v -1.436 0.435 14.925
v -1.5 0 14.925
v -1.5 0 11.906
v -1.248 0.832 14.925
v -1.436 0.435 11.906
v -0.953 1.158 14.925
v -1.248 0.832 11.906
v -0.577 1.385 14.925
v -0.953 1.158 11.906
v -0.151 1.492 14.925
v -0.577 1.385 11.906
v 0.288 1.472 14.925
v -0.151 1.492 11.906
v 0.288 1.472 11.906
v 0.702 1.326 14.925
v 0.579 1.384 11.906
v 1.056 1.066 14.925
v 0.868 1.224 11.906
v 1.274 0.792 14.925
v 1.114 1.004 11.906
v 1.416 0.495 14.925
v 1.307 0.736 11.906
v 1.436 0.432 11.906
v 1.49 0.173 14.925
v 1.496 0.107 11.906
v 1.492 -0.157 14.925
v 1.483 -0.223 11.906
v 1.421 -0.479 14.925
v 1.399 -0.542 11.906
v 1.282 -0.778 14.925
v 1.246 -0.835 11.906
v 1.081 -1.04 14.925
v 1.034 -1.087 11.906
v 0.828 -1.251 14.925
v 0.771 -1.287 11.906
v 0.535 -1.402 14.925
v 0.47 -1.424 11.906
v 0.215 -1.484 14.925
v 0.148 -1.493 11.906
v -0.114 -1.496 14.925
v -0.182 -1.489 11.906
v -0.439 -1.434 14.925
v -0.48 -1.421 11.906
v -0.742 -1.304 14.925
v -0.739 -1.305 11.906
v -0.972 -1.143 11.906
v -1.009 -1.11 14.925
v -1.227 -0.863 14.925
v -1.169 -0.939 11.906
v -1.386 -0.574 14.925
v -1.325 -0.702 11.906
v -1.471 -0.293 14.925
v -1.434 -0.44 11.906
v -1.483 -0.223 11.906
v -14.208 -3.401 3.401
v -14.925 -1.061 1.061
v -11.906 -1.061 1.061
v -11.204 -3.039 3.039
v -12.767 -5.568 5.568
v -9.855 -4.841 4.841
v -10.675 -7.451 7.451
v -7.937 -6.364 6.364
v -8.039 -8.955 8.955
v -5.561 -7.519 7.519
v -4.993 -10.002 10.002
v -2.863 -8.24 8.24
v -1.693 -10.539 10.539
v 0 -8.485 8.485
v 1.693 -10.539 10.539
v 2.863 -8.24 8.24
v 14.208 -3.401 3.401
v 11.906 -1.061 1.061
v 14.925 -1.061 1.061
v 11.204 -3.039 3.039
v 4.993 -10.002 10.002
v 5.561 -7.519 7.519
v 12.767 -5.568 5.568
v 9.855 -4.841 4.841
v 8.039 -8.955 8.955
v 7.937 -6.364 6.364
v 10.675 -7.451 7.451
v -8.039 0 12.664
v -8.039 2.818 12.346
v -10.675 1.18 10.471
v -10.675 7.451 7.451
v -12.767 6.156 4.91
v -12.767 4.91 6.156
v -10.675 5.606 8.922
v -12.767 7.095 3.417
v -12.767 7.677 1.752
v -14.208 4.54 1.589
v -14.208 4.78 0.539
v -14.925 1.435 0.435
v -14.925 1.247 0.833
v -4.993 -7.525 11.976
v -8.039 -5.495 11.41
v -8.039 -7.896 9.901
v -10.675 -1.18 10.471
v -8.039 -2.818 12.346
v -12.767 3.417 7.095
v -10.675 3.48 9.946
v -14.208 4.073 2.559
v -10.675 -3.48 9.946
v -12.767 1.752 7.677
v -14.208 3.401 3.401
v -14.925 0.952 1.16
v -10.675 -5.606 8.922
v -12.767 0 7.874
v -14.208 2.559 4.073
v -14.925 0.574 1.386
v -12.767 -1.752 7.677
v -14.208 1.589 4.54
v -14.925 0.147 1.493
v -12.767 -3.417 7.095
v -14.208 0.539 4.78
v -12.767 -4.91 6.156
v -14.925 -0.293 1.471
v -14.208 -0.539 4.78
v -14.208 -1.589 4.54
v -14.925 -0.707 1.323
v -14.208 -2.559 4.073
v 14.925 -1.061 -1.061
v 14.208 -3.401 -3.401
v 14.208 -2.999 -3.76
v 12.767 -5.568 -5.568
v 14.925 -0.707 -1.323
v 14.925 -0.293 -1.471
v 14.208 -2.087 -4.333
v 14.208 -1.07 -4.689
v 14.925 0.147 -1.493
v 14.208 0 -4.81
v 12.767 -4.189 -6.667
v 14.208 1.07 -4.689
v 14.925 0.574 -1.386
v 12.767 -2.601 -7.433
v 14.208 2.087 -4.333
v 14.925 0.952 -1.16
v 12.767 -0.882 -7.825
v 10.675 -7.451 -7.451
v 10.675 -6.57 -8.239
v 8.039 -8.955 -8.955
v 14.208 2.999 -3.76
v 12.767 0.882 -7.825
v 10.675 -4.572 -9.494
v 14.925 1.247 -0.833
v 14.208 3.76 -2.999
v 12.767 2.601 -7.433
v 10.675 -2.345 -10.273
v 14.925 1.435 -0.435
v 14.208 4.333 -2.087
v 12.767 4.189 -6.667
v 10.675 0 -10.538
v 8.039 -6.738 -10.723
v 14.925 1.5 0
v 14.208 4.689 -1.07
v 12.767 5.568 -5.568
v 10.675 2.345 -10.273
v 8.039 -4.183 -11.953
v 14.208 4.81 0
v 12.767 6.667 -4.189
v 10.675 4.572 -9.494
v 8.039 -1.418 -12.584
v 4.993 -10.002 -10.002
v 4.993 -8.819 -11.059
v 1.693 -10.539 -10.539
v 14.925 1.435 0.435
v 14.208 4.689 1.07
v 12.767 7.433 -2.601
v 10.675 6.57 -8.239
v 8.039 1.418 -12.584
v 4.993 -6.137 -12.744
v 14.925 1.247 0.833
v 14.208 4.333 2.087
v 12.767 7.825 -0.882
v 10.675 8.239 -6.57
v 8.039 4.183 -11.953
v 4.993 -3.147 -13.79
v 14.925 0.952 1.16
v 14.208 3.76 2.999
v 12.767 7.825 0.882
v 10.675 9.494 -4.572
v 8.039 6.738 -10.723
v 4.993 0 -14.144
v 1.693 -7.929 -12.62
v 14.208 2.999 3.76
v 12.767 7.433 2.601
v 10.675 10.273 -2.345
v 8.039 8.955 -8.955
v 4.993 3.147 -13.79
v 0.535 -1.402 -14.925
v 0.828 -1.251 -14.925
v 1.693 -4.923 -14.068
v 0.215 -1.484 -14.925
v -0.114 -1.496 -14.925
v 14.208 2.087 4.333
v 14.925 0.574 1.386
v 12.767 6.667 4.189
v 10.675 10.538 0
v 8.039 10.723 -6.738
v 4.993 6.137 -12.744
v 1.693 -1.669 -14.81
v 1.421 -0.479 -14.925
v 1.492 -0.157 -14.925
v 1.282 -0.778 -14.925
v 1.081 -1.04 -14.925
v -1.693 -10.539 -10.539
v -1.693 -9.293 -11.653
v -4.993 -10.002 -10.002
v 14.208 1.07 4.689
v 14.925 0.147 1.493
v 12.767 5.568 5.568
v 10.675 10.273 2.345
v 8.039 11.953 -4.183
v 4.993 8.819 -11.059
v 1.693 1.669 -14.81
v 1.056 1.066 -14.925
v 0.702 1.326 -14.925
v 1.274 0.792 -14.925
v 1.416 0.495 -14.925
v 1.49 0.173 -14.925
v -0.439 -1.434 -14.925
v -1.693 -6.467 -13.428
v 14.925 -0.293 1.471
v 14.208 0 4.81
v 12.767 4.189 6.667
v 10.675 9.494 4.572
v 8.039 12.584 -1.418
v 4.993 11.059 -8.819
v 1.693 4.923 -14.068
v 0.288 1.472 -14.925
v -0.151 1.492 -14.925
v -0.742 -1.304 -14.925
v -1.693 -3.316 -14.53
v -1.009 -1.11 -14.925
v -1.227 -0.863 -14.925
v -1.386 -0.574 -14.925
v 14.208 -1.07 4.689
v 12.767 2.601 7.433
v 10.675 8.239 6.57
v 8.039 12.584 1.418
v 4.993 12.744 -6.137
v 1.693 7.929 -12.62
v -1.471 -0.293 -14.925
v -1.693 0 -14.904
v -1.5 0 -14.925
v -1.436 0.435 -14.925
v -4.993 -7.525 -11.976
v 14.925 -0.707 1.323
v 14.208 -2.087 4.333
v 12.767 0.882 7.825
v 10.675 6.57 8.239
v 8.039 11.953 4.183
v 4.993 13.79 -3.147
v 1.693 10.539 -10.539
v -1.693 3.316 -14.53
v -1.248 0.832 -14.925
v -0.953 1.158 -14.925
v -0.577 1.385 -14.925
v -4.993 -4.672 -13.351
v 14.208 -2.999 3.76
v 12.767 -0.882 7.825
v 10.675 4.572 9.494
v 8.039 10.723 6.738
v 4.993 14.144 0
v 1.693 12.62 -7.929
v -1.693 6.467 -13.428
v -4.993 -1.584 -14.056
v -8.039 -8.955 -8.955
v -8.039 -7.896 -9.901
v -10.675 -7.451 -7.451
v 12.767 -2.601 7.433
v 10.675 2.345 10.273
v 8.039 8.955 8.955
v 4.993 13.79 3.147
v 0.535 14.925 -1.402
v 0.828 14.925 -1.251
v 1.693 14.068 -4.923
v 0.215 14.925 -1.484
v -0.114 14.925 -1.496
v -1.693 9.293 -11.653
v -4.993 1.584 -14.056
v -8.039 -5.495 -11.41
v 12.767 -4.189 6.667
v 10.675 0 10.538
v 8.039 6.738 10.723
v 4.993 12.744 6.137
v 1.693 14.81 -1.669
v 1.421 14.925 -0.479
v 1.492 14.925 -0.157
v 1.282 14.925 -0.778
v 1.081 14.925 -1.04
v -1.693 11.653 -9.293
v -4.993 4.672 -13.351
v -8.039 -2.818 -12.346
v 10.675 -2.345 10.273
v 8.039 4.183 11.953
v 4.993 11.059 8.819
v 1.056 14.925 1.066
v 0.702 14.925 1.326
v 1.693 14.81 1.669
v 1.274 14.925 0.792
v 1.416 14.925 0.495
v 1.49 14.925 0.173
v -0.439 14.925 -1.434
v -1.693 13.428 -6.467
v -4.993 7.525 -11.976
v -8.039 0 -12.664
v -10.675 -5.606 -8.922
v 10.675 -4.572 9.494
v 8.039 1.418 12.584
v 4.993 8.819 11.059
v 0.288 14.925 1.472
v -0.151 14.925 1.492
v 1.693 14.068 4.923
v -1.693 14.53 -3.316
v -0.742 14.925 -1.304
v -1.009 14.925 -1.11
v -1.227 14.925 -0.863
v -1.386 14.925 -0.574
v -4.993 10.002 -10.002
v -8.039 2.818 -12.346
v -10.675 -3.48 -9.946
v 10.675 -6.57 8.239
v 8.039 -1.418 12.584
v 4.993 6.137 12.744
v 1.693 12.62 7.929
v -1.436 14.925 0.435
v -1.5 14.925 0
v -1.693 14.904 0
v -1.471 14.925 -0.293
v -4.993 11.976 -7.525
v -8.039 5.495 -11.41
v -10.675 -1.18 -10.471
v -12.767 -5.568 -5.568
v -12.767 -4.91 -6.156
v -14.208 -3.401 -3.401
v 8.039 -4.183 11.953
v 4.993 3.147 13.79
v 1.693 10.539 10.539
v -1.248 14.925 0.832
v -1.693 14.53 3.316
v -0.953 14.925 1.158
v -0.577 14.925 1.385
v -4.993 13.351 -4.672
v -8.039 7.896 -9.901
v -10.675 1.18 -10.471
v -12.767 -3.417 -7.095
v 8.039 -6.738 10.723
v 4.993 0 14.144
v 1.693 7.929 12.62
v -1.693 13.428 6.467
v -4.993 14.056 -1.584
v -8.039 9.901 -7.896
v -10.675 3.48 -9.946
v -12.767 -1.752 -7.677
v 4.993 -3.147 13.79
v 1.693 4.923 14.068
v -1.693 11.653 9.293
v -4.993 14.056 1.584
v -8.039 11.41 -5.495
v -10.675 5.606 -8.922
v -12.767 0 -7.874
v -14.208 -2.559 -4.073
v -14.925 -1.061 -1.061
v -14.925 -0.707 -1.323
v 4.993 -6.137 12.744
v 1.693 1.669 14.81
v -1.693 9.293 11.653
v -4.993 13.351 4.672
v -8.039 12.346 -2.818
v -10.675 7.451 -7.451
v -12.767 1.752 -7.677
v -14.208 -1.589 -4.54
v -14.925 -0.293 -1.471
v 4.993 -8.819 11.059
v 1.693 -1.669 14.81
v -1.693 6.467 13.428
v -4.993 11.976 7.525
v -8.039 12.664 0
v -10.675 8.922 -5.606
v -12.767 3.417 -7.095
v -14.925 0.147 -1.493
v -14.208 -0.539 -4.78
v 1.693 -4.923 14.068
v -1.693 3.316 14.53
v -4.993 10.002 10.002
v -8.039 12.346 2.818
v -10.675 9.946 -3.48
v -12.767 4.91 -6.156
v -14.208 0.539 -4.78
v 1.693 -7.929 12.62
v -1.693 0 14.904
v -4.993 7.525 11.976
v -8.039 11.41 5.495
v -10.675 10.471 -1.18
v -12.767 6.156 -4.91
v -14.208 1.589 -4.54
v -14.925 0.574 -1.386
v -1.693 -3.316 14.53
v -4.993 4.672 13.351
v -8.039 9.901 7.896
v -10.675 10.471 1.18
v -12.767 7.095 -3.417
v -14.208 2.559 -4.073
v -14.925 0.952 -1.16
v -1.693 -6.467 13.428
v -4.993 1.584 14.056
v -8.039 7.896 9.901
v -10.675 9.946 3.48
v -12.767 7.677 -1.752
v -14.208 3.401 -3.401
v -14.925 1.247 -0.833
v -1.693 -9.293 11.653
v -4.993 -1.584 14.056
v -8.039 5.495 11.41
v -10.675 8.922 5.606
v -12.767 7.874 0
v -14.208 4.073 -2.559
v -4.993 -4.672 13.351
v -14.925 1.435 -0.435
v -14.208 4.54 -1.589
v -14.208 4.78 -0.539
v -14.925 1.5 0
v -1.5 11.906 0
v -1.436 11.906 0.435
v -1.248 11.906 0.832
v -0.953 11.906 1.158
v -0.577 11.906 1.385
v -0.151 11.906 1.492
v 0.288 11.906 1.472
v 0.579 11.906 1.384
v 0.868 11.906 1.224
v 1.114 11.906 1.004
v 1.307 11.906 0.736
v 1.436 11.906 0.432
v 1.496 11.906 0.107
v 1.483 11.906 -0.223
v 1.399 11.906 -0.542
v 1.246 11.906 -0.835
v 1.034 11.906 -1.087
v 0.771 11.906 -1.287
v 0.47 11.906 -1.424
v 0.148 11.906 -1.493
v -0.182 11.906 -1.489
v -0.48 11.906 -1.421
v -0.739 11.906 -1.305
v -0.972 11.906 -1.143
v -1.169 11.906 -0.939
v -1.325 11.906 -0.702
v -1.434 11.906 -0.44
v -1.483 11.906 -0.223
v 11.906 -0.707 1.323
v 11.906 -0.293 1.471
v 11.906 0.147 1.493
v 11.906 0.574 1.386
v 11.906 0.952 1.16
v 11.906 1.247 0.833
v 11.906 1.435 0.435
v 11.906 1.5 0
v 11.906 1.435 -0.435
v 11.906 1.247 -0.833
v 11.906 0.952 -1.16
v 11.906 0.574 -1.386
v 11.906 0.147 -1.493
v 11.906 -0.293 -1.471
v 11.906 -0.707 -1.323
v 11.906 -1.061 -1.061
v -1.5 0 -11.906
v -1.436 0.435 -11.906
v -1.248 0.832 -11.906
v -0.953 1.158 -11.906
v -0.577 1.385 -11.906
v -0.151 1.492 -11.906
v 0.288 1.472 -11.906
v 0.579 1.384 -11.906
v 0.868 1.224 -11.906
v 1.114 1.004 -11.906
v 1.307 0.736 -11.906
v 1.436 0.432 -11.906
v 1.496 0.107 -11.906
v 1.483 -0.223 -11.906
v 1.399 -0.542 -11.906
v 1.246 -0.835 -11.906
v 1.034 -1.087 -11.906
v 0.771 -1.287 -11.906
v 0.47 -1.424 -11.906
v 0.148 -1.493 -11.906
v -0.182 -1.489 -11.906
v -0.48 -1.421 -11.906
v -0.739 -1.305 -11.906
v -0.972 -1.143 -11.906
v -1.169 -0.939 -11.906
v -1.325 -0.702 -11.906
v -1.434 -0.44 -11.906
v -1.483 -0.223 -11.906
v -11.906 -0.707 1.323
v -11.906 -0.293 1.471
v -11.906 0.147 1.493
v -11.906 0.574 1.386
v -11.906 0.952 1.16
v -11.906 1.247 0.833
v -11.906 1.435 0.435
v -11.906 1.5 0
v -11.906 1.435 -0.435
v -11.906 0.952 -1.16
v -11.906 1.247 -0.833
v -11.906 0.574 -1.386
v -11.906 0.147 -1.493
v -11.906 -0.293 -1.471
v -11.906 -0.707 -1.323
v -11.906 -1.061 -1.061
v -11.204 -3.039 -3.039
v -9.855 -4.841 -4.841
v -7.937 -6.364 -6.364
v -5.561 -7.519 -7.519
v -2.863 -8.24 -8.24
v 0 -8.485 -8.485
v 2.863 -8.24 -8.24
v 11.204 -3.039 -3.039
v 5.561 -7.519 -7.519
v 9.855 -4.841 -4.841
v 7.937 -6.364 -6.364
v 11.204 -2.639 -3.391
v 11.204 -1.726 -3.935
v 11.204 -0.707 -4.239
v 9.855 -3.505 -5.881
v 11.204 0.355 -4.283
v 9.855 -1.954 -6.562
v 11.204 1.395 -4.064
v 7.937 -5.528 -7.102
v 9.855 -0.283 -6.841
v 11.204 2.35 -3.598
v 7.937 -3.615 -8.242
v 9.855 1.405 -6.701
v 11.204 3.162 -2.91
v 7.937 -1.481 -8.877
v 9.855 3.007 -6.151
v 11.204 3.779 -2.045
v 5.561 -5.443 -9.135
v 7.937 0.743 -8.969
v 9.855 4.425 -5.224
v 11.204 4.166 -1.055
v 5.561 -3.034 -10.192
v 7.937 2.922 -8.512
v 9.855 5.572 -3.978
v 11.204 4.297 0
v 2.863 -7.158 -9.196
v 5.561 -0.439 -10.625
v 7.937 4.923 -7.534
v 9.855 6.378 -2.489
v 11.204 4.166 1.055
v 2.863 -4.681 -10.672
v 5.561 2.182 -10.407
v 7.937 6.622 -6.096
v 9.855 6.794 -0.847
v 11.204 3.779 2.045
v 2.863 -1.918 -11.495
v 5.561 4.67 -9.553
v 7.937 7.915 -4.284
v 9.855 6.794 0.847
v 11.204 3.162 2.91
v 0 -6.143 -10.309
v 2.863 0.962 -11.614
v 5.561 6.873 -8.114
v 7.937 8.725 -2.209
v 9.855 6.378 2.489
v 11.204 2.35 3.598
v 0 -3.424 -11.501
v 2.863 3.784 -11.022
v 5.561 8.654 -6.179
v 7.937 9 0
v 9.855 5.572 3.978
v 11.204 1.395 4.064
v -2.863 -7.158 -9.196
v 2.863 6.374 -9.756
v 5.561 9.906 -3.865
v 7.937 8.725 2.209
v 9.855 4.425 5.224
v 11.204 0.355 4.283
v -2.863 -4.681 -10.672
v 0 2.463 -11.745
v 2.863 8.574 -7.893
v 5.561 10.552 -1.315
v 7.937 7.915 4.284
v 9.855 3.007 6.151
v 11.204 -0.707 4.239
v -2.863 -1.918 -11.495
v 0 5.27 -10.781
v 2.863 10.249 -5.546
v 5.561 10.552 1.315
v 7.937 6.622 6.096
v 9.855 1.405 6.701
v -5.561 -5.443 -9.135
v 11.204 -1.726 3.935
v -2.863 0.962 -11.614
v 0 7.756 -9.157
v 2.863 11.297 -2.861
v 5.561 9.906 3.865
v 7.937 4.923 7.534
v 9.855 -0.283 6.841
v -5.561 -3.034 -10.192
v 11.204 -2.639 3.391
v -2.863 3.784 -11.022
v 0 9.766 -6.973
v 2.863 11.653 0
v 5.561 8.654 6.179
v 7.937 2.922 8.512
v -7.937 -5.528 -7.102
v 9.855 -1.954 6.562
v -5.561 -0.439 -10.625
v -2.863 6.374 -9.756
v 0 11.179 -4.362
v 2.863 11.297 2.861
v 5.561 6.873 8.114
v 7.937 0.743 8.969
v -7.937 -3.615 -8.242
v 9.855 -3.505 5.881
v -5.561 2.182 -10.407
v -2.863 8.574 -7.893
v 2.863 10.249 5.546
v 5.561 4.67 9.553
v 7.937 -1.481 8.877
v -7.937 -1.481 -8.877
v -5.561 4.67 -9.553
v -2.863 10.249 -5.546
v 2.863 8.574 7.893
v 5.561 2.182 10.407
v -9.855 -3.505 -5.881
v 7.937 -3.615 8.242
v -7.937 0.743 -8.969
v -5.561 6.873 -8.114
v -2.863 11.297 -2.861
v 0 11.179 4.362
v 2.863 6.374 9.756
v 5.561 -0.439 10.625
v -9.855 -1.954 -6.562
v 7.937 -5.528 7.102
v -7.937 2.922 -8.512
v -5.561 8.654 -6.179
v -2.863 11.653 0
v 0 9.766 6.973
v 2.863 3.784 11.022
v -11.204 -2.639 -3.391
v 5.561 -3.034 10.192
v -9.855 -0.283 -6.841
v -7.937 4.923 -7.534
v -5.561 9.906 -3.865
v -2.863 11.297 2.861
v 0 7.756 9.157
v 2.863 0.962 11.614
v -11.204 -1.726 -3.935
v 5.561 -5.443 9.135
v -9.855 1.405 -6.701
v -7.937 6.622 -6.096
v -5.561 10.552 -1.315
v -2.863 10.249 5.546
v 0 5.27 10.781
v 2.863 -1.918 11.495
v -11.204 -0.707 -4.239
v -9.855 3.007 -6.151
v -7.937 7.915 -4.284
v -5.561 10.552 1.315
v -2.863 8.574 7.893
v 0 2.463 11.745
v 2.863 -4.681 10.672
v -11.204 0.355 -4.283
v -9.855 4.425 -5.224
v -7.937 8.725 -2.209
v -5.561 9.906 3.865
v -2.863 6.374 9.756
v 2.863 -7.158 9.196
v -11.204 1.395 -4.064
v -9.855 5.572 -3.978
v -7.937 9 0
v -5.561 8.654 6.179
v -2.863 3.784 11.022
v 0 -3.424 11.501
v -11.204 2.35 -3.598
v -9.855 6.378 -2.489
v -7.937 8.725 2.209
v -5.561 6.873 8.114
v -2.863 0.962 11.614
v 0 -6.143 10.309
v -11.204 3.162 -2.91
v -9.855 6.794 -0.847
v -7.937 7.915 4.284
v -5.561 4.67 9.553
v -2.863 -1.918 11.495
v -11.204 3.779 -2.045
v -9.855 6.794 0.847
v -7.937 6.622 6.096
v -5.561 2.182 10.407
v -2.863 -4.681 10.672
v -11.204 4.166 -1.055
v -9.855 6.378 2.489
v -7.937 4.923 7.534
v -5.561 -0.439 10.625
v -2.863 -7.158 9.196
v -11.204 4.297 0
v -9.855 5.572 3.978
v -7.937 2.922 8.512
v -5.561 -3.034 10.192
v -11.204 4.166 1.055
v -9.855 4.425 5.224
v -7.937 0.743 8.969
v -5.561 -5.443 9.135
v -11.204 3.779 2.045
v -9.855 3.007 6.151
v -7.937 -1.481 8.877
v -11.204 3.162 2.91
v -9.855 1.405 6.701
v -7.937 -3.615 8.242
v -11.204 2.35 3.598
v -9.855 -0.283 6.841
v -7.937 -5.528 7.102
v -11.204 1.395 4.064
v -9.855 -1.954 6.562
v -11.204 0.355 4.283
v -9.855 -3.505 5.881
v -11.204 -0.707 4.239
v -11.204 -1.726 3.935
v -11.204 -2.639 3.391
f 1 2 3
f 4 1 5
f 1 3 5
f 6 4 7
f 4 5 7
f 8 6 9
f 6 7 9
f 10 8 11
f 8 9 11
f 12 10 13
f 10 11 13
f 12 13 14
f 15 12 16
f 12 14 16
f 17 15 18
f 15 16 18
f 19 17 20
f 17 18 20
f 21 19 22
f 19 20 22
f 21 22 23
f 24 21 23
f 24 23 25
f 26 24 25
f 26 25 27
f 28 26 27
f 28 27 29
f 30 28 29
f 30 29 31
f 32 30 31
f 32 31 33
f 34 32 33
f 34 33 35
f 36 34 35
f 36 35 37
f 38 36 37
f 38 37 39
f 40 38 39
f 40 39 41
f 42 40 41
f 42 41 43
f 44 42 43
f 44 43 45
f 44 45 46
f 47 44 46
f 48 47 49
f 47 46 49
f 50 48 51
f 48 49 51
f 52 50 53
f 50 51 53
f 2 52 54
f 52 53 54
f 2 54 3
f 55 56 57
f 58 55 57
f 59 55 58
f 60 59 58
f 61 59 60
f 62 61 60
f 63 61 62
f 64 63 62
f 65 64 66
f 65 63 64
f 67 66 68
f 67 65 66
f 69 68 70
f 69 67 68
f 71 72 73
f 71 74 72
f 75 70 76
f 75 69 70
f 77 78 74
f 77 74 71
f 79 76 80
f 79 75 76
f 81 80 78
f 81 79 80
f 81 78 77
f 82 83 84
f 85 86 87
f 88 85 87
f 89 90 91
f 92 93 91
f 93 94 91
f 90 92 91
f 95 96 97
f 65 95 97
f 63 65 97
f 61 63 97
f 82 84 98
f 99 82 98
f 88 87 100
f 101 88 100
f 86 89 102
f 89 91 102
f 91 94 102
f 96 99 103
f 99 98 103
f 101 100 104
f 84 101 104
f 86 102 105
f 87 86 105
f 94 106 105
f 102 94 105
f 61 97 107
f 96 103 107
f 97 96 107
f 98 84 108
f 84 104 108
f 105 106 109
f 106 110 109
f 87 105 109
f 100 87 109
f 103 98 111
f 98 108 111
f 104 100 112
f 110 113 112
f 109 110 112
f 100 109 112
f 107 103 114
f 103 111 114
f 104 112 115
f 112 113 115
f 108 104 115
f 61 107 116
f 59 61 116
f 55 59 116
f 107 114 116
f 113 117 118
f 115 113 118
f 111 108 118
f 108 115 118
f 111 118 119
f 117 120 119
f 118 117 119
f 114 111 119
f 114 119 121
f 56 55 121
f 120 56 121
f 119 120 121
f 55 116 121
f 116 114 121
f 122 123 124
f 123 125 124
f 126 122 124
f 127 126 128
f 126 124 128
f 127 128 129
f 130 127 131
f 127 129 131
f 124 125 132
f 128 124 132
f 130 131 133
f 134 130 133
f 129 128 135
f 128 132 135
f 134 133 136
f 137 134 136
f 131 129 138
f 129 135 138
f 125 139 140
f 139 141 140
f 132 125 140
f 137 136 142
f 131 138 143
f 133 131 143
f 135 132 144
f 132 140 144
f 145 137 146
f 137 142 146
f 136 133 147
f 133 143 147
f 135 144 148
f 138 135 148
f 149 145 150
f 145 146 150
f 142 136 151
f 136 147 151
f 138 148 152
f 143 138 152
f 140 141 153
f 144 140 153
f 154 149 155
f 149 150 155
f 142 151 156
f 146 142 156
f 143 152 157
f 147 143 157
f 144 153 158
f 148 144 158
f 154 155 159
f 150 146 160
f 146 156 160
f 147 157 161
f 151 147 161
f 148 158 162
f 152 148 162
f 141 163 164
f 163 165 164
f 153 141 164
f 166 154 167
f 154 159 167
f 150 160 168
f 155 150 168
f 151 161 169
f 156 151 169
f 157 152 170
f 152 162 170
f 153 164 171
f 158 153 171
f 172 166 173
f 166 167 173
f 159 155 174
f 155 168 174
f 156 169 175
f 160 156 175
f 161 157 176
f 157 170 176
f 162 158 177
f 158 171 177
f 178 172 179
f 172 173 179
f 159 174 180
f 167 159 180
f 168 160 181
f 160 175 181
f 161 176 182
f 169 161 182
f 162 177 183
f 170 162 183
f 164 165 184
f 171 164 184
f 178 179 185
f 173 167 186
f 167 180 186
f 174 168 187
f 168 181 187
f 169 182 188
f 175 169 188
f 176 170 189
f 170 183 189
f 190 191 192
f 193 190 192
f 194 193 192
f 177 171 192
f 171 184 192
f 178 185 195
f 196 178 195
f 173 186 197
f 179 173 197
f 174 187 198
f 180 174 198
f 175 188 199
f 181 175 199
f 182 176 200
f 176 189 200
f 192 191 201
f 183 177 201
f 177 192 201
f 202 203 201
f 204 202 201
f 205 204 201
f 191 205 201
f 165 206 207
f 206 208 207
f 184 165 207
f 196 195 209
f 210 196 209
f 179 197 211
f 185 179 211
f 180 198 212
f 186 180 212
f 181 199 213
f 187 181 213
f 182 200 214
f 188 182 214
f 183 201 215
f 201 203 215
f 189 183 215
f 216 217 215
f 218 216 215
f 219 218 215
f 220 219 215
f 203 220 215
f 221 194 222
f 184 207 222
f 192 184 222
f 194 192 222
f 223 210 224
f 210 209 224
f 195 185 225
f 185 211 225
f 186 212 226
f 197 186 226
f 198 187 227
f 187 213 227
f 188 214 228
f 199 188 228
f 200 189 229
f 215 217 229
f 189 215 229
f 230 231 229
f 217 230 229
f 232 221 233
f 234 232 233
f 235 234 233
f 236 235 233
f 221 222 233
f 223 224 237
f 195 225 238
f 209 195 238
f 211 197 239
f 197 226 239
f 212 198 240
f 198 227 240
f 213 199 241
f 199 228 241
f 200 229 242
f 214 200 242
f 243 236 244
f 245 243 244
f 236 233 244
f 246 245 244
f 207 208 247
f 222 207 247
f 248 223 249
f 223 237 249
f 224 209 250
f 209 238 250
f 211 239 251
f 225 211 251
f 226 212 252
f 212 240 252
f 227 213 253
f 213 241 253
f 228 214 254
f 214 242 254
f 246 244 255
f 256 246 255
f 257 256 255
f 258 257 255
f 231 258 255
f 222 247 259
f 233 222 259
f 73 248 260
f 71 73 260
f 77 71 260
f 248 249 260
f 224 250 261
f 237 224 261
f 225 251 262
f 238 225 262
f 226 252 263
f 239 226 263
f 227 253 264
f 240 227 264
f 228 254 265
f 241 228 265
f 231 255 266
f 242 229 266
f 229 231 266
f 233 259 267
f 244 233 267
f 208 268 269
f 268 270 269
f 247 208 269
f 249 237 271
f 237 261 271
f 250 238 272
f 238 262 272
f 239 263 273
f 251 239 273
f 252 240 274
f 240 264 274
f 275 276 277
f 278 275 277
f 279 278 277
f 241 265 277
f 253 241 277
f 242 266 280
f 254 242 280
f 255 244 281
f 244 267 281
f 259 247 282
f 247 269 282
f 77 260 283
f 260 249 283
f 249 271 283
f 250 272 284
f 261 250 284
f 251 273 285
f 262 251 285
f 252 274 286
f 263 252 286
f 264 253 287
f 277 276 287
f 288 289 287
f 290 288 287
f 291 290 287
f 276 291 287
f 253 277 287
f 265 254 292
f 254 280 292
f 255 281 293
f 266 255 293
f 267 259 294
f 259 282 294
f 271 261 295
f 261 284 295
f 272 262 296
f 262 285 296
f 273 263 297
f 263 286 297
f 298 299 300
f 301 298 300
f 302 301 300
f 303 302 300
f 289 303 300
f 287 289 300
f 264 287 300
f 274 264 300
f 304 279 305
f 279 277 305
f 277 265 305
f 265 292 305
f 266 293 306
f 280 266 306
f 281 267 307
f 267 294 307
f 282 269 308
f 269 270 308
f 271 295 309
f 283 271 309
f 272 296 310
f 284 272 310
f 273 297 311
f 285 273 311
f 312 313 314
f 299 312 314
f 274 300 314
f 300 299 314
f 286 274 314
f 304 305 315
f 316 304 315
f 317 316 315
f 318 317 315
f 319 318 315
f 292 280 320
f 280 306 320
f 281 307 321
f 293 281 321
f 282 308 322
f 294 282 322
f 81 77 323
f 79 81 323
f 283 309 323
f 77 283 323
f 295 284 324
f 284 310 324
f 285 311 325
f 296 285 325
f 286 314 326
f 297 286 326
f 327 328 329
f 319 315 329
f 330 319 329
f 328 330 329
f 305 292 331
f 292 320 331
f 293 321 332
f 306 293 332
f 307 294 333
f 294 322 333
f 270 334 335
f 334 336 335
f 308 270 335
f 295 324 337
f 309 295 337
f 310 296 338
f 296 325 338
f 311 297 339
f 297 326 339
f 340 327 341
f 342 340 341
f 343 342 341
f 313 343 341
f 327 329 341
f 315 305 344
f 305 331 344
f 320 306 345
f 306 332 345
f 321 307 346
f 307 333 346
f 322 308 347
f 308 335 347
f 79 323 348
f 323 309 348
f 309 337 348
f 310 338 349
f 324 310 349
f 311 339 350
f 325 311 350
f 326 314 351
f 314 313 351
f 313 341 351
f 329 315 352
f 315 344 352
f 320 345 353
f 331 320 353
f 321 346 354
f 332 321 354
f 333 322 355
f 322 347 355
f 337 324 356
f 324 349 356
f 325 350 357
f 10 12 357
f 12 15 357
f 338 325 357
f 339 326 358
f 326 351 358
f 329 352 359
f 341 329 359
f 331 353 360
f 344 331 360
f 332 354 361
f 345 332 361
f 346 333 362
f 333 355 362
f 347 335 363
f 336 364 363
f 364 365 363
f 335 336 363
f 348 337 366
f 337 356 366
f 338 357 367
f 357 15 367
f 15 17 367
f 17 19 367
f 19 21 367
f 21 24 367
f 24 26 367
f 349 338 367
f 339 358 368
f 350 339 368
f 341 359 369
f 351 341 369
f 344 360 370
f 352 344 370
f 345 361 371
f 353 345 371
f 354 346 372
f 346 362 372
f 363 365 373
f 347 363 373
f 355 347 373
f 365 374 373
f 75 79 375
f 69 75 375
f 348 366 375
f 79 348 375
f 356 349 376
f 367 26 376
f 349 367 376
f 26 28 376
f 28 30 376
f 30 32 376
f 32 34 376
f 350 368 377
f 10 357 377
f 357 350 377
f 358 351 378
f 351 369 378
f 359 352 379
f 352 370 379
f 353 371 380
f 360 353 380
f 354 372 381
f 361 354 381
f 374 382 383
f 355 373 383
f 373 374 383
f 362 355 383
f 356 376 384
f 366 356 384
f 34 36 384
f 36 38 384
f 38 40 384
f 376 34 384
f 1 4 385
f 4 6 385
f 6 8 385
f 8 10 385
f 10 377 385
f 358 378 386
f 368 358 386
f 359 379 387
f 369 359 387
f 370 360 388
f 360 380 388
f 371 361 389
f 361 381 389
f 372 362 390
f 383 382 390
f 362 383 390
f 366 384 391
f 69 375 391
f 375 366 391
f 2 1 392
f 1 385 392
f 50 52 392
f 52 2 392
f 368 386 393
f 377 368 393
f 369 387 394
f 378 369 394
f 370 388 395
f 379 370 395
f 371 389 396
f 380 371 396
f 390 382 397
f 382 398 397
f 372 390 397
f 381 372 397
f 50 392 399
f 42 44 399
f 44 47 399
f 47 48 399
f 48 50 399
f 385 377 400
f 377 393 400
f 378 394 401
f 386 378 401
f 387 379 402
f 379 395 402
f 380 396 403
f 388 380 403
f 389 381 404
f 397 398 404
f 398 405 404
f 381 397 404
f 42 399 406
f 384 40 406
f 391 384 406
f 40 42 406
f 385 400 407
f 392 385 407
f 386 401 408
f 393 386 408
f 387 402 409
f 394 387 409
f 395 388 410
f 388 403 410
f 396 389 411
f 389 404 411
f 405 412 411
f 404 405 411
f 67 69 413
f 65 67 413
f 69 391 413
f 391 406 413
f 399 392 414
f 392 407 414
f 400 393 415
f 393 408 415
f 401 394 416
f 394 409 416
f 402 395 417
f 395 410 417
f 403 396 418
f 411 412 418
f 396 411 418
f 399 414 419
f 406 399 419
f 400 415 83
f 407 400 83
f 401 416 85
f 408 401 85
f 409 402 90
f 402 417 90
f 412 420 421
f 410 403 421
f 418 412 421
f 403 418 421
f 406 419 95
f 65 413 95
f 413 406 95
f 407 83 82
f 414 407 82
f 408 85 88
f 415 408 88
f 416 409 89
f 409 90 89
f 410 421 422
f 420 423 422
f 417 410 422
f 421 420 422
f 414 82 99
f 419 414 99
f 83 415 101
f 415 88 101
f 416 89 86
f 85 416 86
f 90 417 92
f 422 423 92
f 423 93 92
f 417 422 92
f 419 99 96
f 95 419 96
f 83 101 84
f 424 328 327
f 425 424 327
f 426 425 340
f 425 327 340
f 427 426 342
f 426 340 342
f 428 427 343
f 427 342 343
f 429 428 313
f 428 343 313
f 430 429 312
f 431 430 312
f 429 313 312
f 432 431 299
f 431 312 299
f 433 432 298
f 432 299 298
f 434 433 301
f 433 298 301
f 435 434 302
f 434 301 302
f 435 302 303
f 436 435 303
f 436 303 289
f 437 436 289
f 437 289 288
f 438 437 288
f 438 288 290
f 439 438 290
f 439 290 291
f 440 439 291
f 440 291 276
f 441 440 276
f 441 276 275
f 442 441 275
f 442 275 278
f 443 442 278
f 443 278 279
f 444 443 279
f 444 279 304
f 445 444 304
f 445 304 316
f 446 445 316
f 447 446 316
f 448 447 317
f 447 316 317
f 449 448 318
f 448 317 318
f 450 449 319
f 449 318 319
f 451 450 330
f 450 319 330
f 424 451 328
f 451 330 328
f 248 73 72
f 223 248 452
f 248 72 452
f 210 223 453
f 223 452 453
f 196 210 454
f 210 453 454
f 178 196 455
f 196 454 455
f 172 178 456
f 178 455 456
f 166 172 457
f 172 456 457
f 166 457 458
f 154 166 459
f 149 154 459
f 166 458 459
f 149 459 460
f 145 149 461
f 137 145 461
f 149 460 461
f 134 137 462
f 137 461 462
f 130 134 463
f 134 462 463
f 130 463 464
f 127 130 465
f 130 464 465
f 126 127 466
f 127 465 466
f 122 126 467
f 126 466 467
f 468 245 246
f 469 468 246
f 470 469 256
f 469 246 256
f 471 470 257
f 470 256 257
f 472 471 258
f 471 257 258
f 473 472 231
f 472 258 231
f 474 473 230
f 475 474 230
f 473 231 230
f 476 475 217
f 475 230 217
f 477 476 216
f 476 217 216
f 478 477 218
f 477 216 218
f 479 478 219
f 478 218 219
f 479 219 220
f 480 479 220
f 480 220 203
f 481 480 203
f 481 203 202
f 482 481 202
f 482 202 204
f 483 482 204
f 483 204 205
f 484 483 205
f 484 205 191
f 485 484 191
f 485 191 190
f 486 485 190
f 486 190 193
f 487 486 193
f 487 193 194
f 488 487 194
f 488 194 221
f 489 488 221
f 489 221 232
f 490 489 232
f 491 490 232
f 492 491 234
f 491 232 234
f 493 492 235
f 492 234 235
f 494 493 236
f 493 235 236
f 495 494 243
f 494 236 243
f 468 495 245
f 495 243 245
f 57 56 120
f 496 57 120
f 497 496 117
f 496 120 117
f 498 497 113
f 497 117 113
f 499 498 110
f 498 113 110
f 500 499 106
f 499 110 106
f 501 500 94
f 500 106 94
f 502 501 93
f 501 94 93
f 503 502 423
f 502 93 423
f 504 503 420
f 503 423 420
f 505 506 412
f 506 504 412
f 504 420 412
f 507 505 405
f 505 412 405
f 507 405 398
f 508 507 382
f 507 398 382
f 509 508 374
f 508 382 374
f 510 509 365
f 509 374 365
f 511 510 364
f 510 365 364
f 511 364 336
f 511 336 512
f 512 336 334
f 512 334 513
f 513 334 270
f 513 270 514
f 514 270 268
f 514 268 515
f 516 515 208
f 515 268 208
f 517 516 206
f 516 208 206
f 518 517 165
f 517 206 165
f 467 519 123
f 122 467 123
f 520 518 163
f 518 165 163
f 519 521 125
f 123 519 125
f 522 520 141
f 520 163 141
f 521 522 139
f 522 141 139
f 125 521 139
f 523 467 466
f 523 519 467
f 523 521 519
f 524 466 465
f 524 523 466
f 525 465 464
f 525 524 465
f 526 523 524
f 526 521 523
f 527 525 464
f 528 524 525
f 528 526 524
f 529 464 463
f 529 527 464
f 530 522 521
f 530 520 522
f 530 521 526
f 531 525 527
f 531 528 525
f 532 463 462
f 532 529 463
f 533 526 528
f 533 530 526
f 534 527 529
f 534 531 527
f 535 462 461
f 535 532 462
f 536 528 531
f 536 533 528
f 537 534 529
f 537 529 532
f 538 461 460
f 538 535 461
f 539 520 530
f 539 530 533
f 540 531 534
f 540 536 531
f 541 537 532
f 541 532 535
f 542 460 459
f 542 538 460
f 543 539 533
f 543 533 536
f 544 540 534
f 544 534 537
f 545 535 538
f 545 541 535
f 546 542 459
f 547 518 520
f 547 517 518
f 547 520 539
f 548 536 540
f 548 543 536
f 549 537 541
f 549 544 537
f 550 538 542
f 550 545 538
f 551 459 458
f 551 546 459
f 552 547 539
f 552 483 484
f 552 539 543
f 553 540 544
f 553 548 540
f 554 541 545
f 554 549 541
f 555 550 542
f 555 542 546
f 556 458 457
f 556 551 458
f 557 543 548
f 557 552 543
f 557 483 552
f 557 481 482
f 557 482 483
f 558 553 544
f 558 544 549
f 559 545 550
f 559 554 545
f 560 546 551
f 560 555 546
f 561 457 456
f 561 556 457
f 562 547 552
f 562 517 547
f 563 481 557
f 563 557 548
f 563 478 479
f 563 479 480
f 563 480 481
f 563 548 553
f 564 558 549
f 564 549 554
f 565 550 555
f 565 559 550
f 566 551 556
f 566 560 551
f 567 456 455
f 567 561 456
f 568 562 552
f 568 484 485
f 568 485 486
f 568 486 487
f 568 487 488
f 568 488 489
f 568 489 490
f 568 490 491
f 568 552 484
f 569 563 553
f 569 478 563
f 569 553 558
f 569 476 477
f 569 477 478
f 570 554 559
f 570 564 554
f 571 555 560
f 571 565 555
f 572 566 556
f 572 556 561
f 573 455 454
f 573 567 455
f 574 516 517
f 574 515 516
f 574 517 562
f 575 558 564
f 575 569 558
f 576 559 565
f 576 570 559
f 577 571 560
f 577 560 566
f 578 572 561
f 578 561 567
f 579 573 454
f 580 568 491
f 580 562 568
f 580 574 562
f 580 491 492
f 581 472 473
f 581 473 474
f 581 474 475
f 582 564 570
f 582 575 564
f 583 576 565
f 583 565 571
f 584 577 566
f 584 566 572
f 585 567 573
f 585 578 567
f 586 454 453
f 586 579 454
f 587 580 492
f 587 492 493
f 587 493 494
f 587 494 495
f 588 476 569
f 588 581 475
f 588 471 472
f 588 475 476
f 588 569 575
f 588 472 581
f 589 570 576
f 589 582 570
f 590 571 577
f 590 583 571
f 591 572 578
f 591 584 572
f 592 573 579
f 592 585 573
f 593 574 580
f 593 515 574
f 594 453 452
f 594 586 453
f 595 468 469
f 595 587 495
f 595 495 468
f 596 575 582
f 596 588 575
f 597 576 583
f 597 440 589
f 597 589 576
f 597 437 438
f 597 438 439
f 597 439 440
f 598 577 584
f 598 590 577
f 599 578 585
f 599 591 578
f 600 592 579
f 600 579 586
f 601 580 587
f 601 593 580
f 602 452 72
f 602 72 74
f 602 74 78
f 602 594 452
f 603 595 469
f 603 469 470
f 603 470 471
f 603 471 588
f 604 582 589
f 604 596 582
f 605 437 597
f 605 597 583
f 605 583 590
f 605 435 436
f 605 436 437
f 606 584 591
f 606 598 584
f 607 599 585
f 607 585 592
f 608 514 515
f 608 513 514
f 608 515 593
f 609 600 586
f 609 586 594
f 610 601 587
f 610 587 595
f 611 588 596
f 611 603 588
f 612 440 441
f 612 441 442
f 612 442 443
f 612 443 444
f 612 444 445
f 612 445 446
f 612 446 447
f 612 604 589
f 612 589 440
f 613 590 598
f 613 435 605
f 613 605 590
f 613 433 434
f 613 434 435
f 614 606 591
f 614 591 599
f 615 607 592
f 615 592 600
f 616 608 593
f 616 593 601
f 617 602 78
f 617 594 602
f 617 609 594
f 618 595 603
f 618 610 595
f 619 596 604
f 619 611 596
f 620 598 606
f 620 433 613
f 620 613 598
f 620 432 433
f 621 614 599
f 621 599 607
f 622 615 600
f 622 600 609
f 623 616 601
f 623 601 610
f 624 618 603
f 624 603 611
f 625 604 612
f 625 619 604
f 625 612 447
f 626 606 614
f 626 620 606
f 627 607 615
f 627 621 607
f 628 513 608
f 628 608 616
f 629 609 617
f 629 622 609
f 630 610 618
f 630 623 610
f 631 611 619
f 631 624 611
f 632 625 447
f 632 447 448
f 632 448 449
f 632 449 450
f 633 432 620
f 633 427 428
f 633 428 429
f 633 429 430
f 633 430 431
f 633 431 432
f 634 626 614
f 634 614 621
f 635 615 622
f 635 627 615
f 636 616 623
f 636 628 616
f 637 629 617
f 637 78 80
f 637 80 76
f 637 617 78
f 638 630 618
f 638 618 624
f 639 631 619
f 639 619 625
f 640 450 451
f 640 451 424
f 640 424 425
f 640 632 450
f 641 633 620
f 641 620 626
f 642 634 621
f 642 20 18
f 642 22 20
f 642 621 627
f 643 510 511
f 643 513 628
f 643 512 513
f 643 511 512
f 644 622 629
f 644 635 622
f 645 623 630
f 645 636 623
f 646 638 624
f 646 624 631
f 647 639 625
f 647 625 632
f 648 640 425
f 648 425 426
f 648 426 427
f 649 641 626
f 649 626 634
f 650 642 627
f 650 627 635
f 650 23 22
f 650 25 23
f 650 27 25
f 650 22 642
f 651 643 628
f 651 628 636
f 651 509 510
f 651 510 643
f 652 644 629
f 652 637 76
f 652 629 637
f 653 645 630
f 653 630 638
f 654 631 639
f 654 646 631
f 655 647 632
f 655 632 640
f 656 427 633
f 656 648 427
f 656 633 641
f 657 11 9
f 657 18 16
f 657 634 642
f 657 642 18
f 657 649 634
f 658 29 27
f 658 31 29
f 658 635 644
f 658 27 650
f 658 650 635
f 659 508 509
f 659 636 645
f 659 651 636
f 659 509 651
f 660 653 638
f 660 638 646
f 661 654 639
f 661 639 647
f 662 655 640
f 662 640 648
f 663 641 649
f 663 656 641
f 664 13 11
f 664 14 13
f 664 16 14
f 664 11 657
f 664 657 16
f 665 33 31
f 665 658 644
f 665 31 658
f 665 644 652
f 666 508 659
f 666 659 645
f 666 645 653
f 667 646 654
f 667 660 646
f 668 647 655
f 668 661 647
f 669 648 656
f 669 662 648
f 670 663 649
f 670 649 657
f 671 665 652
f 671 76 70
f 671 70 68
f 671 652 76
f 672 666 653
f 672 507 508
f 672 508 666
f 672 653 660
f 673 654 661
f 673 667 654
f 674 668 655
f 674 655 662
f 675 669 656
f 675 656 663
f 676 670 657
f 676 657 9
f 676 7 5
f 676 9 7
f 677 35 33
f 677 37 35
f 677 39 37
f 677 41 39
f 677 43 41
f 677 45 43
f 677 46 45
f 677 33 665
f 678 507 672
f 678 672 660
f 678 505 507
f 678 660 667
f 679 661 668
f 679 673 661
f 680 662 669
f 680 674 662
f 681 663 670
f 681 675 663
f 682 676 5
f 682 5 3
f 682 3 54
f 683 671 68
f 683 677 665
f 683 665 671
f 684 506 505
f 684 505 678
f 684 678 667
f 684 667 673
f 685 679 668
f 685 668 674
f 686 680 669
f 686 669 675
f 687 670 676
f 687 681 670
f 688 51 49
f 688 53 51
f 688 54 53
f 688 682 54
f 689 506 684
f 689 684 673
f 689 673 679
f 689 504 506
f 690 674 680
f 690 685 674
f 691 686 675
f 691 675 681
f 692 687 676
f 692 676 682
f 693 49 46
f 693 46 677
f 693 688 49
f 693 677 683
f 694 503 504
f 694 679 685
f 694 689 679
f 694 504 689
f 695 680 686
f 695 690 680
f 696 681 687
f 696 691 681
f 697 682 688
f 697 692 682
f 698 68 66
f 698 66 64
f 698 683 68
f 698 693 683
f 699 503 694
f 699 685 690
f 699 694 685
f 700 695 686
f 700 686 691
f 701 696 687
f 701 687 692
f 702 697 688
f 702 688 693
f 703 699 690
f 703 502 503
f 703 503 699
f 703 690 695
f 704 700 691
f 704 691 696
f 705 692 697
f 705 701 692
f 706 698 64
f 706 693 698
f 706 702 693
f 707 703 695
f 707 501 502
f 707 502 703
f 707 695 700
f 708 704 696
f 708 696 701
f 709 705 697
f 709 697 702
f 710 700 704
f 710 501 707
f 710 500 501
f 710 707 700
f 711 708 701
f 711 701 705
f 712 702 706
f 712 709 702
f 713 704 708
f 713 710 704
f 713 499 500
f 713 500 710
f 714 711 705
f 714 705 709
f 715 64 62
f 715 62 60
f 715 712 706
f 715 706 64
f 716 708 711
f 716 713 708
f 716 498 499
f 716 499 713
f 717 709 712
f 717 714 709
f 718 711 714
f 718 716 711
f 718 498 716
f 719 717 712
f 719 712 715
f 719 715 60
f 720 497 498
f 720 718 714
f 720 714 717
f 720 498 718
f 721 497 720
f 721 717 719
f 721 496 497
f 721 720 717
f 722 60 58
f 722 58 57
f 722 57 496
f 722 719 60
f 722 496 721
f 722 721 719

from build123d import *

# Parameters (mm, degrees)
F1_ANGLE = 270
F14_T    = -3
F3_D     = 3
F5_D     = 3
F7_ANGLE = 135
F9_D     = 3
F11_D    = 3
F13_D    = 3


with BuildPart() as f1:
    # F0 (on Top) → F1 (revolve)
    with BuildSketch(Plane.XY):
        with BuildLine():
            ThreePointArc((15, 0), (0, 15), (-15, 0))
            Line((-15, 0), (15, 0))
        make_face()
    revolve(axis=Axis((0.571103, 0, 0), (1, 0, 0)), revolution_arc=F1_ANGLE)

    # F14
    f14_openings = [f1.faces().sort_by_distance(p)[0] for p in [
        (0, 6.366198, 0),
        (0, 0, -6.366198),
    ]]
    offset(amount=F14_T, openings=f14_openings)

    # F3 (through all)
    with Locations(Plane.YZ):
        with Locations((0, 0)):
            Hole(F3_D / 2)

    # F5 (through all)
    with Locations(Plane(origin=(0, 0, 0), x_dir=(0, 1, 0), z_dir=(-1, 0, 0))):
        with Locations((0, 0)):
            Hole(F5_D / 2)


with BuildPart() as f1_1:
    # F7: moved
    add(f1.part.rotate(Axis((0, 0, 0), (-1, 0, 0)), F7_ANGLE))

    # F9 (through all)
    with Locations(Plane.XZ):
        with Locations((0, 0)):
            Hole(F9_D / 2)

    # F11 (through all)
    with Locations(Plane.XY):
        with Locations((0, 0)):
            Hole(F11_D / 2)

    # F13 (through all)
    with Locations(Plane(origin=(0, 0, 0), x_dir=(1, 0, 0), z_dir=(0, 0, -1))):
        with Locations((0, 0)):
            Hole(F13_D / 2)


solid = f1_1.part
